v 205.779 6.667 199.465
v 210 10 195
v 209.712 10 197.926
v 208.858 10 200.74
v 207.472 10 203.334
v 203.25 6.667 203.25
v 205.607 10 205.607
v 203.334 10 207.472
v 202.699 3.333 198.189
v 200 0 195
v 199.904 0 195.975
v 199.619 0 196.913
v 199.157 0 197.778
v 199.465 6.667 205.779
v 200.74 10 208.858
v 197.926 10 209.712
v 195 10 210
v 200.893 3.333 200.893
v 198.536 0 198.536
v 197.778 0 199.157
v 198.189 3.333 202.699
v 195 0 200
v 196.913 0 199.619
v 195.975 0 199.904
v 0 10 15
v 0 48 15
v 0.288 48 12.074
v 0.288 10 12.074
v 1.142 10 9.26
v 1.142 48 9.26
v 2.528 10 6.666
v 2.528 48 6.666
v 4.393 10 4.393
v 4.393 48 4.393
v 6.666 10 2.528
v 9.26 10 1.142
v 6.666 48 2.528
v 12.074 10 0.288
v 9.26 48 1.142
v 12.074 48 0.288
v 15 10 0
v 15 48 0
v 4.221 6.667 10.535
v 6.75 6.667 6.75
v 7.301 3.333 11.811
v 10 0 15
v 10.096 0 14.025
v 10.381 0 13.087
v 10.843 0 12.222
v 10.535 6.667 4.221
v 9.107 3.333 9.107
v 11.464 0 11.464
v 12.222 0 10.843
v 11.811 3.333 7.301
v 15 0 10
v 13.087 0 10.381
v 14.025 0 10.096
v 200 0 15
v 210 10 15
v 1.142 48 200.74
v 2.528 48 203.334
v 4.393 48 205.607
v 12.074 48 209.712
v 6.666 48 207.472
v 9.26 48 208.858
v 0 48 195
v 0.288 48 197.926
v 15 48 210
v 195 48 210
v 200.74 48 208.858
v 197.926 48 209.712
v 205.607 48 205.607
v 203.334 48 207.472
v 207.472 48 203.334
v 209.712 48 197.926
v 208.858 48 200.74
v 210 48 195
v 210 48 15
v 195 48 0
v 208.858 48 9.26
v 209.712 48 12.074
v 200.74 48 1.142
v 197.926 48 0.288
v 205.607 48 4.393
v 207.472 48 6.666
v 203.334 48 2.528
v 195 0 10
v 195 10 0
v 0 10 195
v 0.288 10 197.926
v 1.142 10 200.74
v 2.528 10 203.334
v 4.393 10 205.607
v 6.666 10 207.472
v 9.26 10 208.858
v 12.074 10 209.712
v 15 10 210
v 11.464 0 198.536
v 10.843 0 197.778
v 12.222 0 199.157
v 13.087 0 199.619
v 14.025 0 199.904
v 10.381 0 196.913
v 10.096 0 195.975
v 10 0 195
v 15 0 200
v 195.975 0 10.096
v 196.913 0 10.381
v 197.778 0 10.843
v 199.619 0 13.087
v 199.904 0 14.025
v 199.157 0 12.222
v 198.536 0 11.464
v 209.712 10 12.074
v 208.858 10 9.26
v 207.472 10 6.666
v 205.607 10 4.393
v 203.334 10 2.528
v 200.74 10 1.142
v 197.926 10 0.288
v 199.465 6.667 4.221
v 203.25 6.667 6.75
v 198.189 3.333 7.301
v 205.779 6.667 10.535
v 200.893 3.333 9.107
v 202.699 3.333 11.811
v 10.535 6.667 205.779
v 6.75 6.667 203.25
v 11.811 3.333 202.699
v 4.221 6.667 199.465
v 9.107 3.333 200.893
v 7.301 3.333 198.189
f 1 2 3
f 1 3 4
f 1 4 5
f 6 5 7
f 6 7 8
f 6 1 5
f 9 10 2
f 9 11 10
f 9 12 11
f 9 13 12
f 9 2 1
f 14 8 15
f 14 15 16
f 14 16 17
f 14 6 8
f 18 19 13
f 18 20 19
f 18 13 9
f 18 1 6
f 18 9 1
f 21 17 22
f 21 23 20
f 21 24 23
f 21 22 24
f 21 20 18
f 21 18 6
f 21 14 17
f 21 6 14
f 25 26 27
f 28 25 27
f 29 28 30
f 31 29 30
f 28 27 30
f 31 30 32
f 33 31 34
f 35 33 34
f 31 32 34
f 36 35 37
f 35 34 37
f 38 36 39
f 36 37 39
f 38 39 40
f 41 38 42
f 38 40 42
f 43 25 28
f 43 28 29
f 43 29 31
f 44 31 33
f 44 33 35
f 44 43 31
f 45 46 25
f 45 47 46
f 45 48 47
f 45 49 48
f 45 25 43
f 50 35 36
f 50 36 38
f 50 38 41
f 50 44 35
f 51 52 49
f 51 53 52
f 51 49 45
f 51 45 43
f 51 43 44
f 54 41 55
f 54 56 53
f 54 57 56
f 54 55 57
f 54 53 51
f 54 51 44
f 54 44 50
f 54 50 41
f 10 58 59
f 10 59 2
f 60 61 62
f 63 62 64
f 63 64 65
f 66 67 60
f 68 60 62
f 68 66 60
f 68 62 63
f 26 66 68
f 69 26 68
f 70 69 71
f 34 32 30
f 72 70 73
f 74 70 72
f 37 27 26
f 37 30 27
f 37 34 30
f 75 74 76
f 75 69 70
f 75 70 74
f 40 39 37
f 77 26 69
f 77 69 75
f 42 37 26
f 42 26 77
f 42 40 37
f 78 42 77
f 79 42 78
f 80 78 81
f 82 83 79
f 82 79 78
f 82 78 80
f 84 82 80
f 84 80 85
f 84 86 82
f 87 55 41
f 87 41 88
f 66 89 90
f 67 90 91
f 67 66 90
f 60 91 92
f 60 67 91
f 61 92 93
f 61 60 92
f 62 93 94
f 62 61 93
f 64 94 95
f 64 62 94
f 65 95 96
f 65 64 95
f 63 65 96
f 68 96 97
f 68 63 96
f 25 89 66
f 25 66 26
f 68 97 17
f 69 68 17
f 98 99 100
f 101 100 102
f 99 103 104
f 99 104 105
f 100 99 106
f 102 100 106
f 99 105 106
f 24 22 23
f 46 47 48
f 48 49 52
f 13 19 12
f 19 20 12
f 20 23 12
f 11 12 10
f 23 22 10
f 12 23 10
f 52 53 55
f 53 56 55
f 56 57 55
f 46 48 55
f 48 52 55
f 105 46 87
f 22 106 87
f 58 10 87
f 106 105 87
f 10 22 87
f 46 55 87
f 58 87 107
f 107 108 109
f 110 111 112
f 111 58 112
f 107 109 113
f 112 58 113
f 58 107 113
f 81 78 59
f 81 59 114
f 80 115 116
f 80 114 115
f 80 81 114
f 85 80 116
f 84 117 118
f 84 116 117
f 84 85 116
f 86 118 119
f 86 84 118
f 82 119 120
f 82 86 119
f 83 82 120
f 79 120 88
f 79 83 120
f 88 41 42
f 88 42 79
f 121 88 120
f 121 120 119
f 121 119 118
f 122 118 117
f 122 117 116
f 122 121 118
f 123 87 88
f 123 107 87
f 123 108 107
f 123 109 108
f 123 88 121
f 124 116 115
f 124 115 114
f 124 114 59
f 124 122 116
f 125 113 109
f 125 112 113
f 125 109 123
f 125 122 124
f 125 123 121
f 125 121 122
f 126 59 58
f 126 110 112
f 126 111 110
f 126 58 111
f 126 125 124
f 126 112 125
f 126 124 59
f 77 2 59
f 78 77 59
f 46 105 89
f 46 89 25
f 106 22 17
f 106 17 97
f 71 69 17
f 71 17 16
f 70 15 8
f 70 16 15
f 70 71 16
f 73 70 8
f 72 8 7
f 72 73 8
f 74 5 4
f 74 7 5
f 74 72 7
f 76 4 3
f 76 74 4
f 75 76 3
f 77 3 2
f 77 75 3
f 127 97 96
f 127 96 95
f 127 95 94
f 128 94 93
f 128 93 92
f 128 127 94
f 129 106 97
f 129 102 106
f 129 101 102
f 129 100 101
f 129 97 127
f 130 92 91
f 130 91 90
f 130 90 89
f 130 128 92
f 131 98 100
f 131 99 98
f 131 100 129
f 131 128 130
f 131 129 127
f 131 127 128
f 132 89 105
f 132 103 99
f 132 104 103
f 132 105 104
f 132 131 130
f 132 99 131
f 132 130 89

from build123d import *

# Parameters (mm, degrees)
SKETCH_1_W      = 210
SKETCH_1_H      = 210
EXTRUDE_1_DEPTH = 48
FILLET_1_R      = 15
CHAMFER_1_SIZE  = 10


with BuildPart() as part:
    # 草图1 → 凸台-拉伸1 (new body)
    with BuildSketch(Plane(origin=(0, 0, 0), x_dir=(1, 0, 0), z_dir=(0, 1, 0))):
        with Locations((105, -105)):
            Rectangle(SKETCH_1_W, SKETCH_1_H)
    extrude(amount=EXTRUDE_1_DEPTH)

    # 圆角1
    fillet_1_edges = [part.edges().sort_by_distance(p)[0] for p in [
        (0, 24, 0),
        (210, 24, 0),
        (210, 24, 210),
        (0, 24, 210),
    ]]
    fillet(fillet_1_edges, radius=FILLET_1_R)

    # 倒角1
    chamfer_1_edges = [part.edges().sort_by_distance(p)[0] for p in [
        (0, 0, 105),
        (105, 0, 0),
        (210, 0, 105),
        (105, 0, 210),
        (4.393398282, 0, 205.606601718),
        (205.606601718, 0, 205.606601718),
        (205.606601718, 0, 4.393398282),
        (4.393398282, 0, 4.393398282),
    ]]
    chamfer(chamfer_1_edges, length=CHAMFER_1_SIZE)


solid = part.part
